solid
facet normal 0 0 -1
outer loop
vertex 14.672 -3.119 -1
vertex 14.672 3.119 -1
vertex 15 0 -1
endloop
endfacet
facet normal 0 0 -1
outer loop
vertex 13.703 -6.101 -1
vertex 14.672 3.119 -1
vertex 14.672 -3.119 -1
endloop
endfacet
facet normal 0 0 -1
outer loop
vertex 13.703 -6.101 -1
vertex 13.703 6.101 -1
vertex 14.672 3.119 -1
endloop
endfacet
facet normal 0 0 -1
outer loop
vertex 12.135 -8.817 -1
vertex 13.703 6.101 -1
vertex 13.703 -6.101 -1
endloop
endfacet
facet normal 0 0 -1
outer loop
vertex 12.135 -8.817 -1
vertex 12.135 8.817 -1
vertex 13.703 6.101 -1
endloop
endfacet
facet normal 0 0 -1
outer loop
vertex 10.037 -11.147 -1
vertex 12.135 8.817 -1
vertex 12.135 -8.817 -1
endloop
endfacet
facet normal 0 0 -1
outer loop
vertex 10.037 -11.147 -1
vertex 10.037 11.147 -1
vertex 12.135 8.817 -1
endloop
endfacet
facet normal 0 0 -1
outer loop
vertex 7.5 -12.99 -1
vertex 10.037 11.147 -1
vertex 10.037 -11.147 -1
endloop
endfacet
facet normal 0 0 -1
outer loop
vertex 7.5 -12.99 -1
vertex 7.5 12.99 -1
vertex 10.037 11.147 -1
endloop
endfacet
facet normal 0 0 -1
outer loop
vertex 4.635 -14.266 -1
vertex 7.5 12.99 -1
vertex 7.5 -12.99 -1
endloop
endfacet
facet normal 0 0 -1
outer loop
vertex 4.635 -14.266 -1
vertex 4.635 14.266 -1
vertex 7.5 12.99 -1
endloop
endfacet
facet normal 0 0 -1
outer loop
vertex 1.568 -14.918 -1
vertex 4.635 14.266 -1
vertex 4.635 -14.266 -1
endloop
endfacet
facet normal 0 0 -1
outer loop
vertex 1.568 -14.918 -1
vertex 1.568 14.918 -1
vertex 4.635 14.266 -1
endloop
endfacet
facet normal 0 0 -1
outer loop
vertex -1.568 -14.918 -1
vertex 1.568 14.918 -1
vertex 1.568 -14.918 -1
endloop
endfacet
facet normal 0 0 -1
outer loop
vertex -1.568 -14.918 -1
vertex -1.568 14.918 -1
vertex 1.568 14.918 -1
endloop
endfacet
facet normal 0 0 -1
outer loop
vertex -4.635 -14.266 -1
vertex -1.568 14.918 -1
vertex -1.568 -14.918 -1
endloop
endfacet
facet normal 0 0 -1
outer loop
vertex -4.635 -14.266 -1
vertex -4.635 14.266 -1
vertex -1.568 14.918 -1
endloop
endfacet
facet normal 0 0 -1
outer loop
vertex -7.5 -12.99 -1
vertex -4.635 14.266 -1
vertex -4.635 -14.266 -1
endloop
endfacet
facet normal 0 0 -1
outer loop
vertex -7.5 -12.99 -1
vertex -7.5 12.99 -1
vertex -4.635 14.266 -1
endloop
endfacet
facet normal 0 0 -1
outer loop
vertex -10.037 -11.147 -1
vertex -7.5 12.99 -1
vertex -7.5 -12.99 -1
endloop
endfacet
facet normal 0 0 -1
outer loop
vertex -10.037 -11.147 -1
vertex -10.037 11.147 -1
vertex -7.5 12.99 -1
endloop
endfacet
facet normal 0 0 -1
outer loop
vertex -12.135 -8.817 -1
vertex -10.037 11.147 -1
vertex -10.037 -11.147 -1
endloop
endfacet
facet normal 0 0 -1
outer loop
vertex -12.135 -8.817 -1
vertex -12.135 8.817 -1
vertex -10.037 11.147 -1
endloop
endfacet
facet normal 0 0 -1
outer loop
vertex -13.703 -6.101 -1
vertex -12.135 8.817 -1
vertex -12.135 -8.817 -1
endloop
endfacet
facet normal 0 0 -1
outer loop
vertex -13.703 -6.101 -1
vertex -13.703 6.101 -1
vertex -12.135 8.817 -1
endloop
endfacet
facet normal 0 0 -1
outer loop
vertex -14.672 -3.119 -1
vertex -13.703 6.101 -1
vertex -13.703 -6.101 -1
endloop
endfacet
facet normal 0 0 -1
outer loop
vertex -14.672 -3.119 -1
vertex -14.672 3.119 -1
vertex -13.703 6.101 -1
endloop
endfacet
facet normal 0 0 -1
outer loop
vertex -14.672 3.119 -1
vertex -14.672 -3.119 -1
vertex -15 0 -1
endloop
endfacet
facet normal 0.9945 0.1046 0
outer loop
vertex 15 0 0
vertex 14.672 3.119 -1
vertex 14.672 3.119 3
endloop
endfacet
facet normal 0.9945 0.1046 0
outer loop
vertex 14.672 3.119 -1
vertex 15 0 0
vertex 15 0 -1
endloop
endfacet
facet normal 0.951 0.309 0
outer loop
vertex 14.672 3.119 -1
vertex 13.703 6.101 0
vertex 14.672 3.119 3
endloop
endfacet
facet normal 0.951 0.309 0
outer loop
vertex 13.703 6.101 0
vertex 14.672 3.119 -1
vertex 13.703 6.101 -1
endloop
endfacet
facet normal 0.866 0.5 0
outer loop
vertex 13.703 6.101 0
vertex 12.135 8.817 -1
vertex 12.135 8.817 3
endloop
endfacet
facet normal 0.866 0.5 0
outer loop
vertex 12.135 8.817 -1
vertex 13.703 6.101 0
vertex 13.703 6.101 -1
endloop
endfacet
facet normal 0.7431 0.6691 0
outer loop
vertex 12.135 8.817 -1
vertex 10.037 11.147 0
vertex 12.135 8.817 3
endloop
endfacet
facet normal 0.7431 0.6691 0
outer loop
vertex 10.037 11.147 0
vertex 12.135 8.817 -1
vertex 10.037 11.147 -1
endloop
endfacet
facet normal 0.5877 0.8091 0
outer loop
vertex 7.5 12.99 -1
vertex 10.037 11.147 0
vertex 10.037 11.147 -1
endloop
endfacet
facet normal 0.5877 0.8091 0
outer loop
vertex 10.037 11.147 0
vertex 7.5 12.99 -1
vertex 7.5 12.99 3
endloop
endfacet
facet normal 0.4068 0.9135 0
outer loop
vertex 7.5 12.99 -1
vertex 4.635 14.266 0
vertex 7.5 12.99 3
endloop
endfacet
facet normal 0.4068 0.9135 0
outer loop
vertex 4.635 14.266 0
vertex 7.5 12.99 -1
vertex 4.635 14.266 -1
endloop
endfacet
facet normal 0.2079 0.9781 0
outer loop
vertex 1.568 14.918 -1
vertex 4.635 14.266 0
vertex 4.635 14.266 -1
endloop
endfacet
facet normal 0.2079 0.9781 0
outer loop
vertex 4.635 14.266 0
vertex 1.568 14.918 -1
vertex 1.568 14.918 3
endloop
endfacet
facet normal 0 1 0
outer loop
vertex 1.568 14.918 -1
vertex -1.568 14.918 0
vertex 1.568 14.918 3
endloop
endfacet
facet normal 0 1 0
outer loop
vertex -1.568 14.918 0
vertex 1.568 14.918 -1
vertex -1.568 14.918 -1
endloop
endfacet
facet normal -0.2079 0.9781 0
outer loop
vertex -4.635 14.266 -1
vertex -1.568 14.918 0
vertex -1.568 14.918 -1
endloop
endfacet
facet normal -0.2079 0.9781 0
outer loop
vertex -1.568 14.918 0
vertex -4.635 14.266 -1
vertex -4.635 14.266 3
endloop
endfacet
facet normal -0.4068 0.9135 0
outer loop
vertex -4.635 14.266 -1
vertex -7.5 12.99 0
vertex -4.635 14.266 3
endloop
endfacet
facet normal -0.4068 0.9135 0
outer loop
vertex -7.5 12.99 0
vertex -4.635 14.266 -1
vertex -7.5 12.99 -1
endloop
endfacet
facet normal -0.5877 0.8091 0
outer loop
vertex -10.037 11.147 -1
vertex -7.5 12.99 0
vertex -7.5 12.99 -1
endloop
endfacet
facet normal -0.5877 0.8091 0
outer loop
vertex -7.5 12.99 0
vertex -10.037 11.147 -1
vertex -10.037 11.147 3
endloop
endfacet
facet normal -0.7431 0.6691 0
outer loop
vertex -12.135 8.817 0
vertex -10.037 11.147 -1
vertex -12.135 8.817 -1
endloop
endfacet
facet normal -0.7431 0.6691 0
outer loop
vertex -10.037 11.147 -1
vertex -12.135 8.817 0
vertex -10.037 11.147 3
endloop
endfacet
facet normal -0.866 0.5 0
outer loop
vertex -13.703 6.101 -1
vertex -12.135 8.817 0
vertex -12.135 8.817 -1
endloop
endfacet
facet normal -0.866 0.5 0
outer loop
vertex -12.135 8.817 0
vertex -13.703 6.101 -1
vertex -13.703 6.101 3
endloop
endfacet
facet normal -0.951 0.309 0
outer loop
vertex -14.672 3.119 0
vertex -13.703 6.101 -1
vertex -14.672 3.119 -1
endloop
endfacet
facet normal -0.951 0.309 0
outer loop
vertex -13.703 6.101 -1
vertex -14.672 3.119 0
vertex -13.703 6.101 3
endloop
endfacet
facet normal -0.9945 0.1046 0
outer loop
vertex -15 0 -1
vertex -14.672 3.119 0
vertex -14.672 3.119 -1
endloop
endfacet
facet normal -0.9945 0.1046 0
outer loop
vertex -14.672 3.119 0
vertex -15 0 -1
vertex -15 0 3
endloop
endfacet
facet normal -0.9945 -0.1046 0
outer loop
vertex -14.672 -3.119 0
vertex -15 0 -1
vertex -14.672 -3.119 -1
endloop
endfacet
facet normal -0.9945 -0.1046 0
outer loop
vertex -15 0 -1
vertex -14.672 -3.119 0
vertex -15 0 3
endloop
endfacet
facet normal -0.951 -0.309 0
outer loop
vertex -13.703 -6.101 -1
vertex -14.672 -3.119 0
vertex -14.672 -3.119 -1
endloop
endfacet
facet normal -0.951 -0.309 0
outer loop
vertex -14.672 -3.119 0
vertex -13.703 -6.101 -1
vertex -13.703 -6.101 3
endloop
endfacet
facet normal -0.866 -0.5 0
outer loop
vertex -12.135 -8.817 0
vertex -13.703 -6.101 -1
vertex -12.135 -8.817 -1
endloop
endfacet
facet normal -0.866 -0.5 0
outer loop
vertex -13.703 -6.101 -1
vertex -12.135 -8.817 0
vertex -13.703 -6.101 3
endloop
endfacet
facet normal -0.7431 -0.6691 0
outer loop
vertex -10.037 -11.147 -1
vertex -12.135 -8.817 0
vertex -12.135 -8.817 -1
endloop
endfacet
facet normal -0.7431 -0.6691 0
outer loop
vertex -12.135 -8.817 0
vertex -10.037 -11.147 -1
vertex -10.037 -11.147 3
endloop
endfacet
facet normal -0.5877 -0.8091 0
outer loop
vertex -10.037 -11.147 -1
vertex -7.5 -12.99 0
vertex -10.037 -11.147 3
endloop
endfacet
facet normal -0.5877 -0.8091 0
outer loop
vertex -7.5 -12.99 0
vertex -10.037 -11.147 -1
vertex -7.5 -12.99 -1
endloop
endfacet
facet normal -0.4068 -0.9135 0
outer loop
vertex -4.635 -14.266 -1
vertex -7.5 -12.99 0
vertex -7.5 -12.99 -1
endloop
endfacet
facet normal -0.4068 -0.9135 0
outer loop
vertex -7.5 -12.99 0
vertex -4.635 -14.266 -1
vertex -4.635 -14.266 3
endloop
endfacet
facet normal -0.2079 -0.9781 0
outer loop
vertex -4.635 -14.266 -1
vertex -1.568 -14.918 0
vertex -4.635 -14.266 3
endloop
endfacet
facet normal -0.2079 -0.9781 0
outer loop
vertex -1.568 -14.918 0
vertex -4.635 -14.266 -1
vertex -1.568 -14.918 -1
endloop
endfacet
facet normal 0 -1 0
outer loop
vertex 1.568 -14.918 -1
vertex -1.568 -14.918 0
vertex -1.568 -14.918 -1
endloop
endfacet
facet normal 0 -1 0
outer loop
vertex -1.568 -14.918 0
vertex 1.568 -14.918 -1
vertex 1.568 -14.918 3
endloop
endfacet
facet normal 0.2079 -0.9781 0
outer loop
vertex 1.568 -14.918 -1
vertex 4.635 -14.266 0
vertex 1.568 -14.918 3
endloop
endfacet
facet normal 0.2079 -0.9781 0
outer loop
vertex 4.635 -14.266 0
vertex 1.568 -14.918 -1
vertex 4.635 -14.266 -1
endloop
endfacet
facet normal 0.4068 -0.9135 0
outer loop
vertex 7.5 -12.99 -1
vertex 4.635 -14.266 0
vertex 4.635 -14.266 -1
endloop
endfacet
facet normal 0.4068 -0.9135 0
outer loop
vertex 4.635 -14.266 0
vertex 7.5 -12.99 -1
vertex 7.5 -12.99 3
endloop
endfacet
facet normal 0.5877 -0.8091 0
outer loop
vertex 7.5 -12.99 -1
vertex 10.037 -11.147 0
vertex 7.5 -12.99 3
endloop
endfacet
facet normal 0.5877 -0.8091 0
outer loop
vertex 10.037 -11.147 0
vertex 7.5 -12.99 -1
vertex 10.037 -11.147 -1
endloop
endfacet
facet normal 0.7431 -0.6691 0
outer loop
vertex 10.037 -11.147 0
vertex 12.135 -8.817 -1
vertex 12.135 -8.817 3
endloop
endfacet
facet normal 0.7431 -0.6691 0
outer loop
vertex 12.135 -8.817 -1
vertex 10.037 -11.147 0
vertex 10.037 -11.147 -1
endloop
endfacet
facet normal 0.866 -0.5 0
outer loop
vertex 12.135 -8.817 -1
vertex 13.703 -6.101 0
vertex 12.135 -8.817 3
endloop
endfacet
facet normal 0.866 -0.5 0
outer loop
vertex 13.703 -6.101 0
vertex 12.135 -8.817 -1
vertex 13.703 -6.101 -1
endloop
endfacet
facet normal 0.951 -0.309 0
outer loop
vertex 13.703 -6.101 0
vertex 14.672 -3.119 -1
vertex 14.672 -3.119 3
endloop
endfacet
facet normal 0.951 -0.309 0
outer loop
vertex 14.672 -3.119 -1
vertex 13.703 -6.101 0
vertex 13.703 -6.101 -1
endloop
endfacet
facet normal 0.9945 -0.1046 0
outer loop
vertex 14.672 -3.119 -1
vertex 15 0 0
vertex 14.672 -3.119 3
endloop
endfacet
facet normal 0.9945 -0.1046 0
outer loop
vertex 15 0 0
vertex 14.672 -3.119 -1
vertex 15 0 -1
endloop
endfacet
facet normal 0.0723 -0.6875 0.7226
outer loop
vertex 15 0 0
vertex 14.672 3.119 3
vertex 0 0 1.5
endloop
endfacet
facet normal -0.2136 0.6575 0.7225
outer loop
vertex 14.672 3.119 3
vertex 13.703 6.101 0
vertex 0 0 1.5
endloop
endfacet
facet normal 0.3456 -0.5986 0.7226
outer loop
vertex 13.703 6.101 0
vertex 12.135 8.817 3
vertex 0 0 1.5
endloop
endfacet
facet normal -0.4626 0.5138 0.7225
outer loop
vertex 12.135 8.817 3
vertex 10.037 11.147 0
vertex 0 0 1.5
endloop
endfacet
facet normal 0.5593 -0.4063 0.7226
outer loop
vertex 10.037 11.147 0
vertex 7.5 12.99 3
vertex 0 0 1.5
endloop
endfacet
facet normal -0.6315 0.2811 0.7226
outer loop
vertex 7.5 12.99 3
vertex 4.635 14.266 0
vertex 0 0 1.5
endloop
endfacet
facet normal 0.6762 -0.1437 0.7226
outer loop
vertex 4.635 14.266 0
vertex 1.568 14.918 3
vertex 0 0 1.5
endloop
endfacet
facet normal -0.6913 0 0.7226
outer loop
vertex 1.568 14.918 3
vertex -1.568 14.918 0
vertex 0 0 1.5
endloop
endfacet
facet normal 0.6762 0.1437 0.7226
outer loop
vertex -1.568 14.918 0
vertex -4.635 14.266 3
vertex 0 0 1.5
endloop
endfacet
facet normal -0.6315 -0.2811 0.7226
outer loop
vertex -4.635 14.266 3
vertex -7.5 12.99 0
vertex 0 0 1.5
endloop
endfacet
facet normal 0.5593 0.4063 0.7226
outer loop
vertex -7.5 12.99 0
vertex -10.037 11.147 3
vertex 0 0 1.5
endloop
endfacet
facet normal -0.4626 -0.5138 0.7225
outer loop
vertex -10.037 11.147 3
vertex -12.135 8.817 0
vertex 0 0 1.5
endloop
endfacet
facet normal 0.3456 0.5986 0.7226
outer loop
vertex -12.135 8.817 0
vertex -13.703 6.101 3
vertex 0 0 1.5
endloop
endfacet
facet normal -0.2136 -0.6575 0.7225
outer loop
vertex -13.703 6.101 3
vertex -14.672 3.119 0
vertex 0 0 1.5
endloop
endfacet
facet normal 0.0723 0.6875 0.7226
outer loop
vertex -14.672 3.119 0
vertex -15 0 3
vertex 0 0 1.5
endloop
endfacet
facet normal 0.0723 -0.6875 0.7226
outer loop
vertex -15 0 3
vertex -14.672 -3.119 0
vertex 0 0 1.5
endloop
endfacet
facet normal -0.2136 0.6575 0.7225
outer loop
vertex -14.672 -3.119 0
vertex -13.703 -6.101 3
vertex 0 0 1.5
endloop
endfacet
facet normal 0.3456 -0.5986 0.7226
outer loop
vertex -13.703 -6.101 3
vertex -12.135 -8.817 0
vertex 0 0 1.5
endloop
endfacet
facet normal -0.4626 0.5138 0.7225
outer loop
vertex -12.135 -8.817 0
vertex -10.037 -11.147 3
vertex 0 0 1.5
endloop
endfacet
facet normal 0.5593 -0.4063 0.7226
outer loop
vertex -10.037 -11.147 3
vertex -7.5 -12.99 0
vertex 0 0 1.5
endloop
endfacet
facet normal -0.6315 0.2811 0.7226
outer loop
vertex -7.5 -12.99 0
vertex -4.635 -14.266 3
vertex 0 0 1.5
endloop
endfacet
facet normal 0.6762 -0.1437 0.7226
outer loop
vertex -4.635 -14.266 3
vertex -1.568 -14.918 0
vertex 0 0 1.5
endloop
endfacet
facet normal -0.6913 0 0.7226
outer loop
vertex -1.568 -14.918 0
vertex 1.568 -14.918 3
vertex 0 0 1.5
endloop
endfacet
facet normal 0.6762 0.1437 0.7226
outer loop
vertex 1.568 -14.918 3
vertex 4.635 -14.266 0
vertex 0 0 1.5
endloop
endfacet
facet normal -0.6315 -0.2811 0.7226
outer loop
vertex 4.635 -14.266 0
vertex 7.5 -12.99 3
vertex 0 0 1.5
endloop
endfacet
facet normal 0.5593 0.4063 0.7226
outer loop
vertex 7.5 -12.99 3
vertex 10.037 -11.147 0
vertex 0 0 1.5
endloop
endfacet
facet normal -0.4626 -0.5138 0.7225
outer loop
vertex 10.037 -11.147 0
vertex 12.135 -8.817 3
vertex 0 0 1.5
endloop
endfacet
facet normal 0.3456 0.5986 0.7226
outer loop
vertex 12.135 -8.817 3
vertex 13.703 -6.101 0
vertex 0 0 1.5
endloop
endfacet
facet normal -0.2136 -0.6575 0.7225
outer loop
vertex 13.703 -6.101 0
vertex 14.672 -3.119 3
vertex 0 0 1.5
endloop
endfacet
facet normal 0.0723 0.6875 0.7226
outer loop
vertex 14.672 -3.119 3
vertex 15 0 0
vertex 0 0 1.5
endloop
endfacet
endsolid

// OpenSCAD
module phone(){
    hull(){
        translate([0,-35,0]) cylinder(r=6,h=170);
        translate([0,35,0]) cylinder(r=6,h=170);
    }
}
 

module angle_lock(h=3,radius=15,steps=30){
    angle = 360/steps;
    points = [
        for(i=[0:angle:360-1])
            [cos(i)*radius,sin(i)*radius,-1],
        for(i=[0:angle:360-1])
            [cos(i)*radius,sin(i)*radius,h*((i/angle)%2)],[0,0,h/2]
    ];
    faces = [
        [for(i=[0:1:steps-1]) i],// bottom
        for(i=[0:1:steps-1]) 
                [i+steps,((i+1)%steps)+steps, (i+1)%steps,i],
        for(i=[0:1:steps-1])
           [ steps*2,((i+1)%steps)+steps,i+steps],// top

    ];
    polyhedron(points,faces,convexity=5);
}
module support(){
    largeur = 85;
    difference(){
        translate([-7.5,-largeur/2,0]) cube([16,largeur,120]);
        translate([0,0,4]) phone();
        cube([20,20,9],center=true);
        translate([0,-36,10]) cube([20,72,170]);
    }
}
module arm(){
    difference(){
        hull(){
            translate([-40,-15,15]) rotate([90,0,0]) cylinder(r=15,h=4  );
            translate([-9,-35,25]) cube([3,10,30]);
        }
        
    }
    
}
module screw_hole(){
    translate([0,0,0]) 
        rotate([90,0,0]) 
        cylinder(r=4,h=100, center=true);
    translate([0,25,0]) 
        rotate([90,0,0]) 
        cylinder(r=8,h=10,center=true);
    translate([0,-25,0]) 
        rotate([90,0,0]) 
        cylinder(r=8,h=10,center=true);    
    }
    
module full_support(){
    support();
    translate([-40,0,15]) rotate([90,0,0]){
        translate([0,0,-15]) 
            angle_lock();
        translate([0,0,15]) 
            rotate([0,180,0]) 
            angle_lock();
    }
    arm();
    mirror([0,1,0]) arm();
}
module tail_support(){
        translate([-20,0,-5]) difference(){ 
        rotate([0,8,0]) 
            translate([-15,-12,-100]) cube([15,24,100]);
        translate([-30,-13,-105]) cube([15,26,110]);
    }
}
module pillar(){
    difference(){
        translate([0,0,30]) rotate([90,0,0]){
            translate([0,0,12]) rotate([0,0,6]) angle_lock();
            translate([0,0,-12]) rotate([0,180,6]) angle_lock();
            hull(){
                cylinder(r=15,h=24,center=true);
                translate([0,-30,0]) cube([30,1,24],center=true);
            }
        }
        translate([0,0,-3]) fixture(0.5);
        translate([0,0,30]) screw_hole();

    }
}

module fixture(tolerance=0){
    for(i = [0:36:360]){
        rotate([0,0,i]) translate([8,0,-1]) cylinder(r=2+tolerance,h=21);
        }
    translate([0,0,-1]) cylinder(r=9+tolerance,h=21);
    translate([0,0,19]) cylinder(r1=8+tolerance,r2=1+tolerance,h=9+tolerance);
    
    }
module plate(){
    difference(){
        union(){
            hull(){
                for (i=[0:90:360]){
                    rotate([0,0,i+45]) 
                        translate([20,0,0]) 
                        sphere(r=4);
                }
            }
            fixture(0);
        }
        translate([-20,-20,-4])cube([40,40,4]);
        for (i=[0:90:360]){
            rotate([0,0,i+45]){ 
                translate([17,0,-1]) 
                    cylinder(r=2,h=10);
                translate([17,0,2]) 
                    cylinder(r=4,h=10);
            }
        }
    }
}
            angle_lock();

*difference(){
    full_support();
    translate([-40,0,15]) screw_hole();
    translate([-10,36,40]) cube([10,1,40], center=true);
    translate([-10,-36,40]) cube([10,1,40], center=true);
    translate([-10,29,66.5]) rotate([45,0,0]) cube([10,1,20], center=true);
    translate([-10,-29,66.5]) rotate([-45,0,0]) cube([10,1,20], center=true);
    translate([-10,29,13]) rotate([-45,0,0]) cube([10,1,20], center=true);
    translate([-10,-29,13]) rotate([45,0,0]) cube([10,1,20], center=true);
}
*pillar();    
*plate();
